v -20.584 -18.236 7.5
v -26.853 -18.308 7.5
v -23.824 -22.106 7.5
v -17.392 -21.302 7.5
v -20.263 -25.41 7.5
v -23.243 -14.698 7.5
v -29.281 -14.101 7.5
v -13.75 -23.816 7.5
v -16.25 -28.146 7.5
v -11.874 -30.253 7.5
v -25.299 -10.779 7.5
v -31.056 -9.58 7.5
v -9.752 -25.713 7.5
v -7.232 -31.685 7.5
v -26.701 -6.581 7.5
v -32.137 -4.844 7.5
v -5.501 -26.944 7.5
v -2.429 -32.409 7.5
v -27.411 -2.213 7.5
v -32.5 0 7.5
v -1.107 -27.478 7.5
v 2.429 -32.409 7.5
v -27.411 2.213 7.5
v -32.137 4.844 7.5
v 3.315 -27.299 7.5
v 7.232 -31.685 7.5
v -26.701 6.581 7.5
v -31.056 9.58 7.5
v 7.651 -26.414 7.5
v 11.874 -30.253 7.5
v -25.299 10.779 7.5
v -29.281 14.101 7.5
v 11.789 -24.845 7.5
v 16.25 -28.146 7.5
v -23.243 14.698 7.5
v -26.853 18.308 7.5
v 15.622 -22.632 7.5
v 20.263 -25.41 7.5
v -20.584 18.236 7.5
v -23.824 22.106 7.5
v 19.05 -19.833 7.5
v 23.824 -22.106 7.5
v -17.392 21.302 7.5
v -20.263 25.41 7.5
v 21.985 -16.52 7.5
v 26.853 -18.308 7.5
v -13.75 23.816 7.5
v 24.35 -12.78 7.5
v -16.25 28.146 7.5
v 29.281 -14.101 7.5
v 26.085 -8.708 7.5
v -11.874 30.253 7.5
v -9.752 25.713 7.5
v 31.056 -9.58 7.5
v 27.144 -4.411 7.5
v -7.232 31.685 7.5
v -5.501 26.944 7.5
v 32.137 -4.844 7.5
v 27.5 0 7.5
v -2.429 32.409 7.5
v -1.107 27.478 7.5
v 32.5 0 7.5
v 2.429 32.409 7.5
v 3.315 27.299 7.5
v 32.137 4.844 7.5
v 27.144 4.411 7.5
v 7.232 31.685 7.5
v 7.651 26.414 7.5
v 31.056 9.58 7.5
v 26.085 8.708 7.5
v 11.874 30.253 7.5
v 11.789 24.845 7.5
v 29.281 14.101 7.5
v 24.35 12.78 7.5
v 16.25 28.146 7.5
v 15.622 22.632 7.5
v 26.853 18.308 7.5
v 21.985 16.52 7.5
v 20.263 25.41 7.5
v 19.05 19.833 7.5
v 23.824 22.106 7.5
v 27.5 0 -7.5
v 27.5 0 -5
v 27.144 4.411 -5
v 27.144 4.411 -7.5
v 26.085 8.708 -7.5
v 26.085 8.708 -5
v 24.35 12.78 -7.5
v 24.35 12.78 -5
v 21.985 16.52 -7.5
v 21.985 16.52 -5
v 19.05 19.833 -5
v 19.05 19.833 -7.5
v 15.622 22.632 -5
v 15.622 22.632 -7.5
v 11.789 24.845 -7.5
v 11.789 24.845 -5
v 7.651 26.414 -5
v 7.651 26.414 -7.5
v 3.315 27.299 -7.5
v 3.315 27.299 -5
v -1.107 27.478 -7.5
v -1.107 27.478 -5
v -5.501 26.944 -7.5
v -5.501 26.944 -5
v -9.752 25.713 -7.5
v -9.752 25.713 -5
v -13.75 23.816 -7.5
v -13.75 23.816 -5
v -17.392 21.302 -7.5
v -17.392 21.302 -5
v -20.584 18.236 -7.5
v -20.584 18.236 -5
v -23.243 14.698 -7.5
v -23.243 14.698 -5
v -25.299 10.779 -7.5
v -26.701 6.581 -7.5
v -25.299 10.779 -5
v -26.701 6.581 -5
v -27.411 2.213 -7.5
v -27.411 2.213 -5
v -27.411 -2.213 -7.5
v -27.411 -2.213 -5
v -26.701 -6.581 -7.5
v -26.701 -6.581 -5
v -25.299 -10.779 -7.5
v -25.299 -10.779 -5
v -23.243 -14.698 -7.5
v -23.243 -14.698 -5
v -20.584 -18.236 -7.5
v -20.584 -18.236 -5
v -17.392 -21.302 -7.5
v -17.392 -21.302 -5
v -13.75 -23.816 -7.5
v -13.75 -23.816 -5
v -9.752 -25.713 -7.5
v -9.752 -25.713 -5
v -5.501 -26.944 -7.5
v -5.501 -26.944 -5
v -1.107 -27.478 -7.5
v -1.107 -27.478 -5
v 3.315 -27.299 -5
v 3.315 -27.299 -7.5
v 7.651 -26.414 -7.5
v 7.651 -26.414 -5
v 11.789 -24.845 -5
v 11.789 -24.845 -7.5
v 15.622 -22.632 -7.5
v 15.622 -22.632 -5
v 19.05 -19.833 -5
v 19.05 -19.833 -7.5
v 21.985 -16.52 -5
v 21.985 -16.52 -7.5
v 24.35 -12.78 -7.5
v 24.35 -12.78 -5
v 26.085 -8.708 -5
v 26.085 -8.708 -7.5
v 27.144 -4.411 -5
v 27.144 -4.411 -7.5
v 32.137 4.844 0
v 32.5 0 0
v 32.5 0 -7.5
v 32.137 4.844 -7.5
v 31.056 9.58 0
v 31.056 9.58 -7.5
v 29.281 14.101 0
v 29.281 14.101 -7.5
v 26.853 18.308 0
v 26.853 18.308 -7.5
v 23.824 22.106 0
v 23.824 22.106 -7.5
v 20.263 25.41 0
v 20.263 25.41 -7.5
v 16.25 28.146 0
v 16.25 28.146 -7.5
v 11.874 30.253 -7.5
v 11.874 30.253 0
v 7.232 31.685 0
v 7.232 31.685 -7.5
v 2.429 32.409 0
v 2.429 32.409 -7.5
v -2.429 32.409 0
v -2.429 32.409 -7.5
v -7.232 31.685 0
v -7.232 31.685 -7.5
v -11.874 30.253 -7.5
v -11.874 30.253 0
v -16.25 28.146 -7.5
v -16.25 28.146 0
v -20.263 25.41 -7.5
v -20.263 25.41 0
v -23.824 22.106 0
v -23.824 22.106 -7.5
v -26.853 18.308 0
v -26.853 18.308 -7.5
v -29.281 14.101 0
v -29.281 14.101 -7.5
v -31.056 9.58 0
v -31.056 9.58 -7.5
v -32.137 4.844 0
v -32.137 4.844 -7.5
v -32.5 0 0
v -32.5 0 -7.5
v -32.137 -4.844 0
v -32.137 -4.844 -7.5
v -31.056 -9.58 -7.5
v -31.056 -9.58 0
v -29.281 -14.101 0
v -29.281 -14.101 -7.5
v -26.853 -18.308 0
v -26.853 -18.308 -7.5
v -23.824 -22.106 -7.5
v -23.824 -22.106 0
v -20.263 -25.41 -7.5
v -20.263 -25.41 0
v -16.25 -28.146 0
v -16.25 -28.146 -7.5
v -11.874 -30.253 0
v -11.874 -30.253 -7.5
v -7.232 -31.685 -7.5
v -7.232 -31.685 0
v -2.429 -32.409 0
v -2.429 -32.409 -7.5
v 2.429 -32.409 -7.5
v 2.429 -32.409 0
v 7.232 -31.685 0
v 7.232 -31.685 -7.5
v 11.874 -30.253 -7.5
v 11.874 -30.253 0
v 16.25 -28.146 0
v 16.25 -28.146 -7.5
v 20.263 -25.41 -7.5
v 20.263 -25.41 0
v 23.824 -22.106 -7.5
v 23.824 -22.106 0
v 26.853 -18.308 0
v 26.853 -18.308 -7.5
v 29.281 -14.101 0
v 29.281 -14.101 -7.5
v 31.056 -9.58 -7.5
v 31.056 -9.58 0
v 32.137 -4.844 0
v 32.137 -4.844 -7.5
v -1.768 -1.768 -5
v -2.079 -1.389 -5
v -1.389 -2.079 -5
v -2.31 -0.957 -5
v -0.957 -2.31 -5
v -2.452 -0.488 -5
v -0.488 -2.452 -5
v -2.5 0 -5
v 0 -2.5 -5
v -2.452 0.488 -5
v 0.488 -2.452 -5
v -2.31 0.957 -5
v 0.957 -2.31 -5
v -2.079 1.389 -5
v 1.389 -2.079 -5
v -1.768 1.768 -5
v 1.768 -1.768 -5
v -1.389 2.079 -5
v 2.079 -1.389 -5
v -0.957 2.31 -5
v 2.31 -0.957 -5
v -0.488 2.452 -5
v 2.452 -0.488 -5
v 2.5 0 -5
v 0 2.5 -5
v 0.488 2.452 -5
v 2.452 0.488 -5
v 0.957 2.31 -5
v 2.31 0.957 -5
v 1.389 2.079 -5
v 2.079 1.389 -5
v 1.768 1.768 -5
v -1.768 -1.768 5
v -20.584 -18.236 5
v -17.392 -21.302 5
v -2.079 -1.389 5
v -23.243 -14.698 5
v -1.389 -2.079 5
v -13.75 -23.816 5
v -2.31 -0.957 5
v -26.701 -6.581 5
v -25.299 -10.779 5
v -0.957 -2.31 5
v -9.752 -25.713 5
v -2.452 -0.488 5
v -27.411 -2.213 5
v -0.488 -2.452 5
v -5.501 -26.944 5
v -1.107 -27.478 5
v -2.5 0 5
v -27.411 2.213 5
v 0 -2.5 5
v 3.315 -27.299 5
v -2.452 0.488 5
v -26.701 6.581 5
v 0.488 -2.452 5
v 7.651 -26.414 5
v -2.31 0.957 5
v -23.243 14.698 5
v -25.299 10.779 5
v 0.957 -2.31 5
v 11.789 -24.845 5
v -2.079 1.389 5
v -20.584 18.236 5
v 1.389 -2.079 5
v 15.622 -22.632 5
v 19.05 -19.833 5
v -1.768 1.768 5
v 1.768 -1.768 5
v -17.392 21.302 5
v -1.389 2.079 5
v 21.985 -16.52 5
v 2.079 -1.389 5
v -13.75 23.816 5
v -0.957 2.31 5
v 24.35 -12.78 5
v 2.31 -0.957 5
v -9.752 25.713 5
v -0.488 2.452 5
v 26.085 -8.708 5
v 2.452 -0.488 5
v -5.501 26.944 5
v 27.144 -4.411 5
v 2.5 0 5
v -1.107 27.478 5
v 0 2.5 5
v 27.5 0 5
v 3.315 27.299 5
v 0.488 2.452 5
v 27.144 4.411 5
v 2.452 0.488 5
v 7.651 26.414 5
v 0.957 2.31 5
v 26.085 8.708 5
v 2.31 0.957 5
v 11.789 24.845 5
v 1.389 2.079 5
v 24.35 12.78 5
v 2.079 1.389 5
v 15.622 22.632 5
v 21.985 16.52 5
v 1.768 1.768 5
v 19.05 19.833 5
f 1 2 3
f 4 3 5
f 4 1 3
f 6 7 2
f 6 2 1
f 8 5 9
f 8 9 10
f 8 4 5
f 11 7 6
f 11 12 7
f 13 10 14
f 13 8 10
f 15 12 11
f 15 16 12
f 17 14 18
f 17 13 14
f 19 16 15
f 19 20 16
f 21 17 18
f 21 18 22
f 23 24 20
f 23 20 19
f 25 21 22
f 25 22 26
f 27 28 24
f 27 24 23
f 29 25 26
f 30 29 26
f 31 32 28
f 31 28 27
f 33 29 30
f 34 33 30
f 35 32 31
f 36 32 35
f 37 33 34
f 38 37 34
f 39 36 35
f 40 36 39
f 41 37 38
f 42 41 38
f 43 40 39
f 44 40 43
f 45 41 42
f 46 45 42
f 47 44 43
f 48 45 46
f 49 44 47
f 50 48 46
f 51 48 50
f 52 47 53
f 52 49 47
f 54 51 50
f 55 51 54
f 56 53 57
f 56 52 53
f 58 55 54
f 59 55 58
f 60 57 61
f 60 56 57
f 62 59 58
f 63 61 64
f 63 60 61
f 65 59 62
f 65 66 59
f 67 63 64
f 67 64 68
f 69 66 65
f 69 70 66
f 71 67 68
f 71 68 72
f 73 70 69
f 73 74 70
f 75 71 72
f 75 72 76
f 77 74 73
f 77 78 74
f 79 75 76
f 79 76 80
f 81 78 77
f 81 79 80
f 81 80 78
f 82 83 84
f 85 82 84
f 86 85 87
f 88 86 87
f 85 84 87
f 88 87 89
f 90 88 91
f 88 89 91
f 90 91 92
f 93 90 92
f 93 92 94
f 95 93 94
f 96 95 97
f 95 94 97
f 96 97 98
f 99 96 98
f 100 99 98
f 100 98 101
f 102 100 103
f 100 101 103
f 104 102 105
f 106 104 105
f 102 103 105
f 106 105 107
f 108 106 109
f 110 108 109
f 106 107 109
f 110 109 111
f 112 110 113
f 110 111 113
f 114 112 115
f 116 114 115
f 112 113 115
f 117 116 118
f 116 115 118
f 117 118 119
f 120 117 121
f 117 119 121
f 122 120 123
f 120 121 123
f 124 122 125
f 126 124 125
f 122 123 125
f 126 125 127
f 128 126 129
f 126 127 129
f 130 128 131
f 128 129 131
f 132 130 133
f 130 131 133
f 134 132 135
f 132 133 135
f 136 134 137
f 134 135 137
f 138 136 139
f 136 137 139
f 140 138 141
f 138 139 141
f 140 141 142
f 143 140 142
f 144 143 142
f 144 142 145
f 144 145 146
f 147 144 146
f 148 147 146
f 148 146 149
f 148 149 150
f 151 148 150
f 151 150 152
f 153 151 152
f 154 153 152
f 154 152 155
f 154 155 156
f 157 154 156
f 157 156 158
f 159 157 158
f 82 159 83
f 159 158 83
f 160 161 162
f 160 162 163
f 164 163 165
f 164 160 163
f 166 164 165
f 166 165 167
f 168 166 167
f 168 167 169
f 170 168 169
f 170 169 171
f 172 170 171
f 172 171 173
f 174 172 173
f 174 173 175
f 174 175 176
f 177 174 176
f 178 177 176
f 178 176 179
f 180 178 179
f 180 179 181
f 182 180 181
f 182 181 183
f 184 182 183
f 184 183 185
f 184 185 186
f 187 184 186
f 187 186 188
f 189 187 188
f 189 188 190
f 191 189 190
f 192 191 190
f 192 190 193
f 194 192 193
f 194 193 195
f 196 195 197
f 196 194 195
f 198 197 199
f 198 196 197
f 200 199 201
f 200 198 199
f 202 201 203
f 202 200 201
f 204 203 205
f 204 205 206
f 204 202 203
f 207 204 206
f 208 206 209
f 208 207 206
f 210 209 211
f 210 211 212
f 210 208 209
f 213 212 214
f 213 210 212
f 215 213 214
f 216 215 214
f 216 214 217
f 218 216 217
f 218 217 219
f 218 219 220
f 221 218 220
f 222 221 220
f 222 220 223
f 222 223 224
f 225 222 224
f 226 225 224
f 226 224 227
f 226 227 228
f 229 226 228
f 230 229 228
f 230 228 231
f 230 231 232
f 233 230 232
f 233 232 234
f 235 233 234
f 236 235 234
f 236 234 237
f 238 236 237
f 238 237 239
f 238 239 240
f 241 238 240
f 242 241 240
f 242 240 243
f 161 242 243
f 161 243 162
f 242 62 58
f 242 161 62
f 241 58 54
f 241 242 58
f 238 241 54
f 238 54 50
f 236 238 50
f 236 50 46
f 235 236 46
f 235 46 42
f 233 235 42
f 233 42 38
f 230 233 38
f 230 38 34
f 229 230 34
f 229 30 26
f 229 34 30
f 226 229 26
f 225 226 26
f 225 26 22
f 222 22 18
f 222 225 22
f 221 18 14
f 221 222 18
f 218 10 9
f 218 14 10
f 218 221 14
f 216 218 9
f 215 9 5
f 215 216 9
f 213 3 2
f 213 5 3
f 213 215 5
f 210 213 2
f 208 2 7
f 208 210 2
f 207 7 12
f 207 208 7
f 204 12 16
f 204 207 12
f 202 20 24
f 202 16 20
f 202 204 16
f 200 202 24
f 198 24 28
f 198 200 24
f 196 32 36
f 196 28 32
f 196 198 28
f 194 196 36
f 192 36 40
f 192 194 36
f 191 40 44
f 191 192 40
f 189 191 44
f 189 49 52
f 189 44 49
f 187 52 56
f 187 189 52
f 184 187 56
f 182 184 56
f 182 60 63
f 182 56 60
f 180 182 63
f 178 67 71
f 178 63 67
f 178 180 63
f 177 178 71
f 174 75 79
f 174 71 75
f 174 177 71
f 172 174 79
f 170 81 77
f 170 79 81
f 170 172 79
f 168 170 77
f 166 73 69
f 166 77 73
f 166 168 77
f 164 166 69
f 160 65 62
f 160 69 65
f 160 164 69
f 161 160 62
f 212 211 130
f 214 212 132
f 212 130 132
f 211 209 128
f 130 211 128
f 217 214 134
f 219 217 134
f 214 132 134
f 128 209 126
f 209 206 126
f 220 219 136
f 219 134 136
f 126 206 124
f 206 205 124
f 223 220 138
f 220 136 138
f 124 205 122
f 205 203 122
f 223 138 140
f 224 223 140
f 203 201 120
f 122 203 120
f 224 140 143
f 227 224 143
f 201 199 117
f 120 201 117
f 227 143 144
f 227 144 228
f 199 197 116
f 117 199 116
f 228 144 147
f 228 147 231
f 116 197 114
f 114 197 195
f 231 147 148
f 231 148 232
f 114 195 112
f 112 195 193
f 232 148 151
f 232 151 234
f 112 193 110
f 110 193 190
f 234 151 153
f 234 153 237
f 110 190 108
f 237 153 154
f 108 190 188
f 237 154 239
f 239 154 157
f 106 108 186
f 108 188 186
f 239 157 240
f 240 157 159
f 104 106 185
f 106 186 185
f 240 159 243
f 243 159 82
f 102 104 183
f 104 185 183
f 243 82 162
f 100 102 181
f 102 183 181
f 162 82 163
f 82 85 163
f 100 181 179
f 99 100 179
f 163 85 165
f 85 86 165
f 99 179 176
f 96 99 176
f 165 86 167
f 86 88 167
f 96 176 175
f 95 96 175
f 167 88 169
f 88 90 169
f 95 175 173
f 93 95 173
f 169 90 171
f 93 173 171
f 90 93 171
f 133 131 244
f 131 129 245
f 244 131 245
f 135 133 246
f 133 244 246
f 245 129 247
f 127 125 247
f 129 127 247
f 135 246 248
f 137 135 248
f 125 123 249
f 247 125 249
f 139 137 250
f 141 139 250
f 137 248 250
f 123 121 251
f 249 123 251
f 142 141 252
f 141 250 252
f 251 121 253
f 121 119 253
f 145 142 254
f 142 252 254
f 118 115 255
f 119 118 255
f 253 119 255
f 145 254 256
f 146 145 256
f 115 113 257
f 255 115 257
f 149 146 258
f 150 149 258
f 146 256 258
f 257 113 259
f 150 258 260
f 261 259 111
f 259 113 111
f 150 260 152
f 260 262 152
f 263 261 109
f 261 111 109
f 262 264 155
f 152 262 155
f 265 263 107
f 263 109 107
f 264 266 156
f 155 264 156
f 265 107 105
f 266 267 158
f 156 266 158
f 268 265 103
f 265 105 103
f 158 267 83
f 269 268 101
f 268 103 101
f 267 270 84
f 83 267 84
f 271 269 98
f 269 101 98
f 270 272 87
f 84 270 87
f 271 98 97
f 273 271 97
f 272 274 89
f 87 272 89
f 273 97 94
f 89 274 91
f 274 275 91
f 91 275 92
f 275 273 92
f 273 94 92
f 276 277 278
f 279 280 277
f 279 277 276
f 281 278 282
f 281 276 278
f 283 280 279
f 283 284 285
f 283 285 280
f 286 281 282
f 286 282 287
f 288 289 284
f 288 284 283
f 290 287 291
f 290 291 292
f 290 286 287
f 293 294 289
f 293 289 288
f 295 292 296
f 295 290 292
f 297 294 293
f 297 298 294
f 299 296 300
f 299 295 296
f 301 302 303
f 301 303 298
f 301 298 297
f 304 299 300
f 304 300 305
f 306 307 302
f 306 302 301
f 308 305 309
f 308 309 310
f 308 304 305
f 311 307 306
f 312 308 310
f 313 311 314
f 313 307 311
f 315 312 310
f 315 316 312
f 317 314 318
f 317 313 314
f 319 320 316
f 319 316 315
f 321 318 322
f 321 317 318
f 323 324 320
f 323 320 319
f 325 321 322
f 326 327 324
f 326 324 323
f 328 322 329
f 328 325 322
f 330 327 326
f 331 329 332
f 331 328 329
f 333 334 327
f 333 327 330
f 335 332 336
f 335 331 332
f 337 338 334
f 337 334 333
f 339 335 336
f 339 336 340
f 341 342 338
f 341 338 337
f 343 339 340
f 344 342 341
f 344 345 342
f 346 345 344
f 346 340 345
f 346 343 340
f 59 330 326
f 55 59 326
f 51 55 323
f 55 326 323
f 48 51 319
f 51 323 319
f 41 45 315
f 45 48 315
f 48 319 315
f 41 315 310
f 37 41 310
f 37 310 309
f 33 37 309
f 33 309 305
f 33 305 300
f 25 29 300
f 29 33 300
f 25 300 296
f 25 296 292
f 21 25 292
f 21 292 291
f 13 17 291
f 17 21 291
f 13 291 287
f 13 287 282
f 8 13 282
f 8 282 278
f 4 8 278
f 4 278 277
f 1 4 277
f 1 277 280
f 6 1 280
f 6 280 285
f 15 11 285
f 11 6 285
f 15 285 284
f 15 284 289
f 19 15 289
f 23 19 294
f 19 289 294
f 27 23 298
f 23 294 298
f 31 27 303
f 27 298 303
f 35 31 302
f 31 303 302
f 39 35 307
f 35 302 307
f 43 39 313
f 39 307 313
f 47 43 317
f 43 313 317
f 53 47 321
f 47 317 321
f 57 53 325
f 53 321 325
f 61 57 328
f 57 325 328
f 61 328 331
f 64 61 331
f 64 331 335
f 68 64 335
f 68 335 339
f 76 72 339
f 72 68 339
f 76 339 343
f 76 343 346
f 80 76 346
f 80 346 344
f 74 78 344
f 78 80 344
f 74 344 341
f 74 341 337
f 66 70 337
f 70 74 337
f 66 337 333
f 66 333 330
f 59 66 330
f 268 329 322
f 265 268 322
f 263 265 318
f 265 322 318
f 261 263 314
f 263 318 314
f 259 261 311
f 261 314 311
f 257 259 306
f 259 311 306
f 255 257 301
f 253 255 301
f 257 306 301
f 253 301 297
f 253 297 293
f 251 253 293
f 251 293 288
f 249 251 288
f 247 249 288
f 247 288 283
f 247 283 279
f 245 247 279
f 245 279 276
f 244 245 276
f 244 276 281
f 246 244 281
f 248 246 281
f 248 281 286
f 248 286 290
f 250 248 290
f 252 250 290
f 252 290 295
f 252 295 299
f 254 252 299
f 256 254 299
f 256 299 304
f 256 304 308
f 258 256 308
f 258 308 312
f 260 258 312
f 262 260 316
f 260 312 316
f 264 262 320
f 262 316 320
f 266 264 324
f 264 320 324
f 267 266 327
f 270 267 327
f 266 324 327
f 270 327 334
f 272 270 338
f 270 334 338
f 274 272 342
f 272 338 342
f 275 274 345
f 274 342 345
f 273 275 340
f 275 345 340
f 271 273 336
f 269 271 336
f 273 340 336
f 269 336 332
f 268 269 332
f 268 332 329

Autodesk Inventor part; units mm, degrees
ref_plane "YZ Plane" through (0, 0, 0) normal (1, 0, 0) x (0, 1, 0)
ref_plane "XZ Plane" through (0, 0, 0) normal (0, 1, 0) x (-1, 0, 0)
ref_plane "XY Plane" through (0, 0, 0) normal (0, 0, 1) x (1, 0, 0)
sketch "Szkic1" plane through (0, 0, 0) normal (0, 0, 1) x (1, 0, 0)
  circle A0 centre (0, 0) radius 27.5
  dimension "d0" = 55
extrude "Wyciągnięcie proste1" add sketch "Szkic1" along normal mid plane 10
sketch "Szkic3" plane through (0, 0, 0) normal (0, 0, 1) x (1, 0, 0)
  circle A0 centre (0, 0) radius 32.5
  circle A1 centre (0, 0) radius 27.5
  dimension "d4" = 65
  dimension "d5" = 55
extrude "Wyciągnięcie proste2" add sketch "Szkic3" along normal mid plane 15
sketch "Szkic4" plane through (0, 0, -7.5) normal (0, 0, -1) x (-1, 0, 0)
  point P0 (0, 0)
  point P1 (0, 0)
hole "Otwór1" at (0, 0, -7.5) direction (0, 0, 1) diameter 5 end through all
properties part number "Koło" material "Tworzywo sztuczne PET"
